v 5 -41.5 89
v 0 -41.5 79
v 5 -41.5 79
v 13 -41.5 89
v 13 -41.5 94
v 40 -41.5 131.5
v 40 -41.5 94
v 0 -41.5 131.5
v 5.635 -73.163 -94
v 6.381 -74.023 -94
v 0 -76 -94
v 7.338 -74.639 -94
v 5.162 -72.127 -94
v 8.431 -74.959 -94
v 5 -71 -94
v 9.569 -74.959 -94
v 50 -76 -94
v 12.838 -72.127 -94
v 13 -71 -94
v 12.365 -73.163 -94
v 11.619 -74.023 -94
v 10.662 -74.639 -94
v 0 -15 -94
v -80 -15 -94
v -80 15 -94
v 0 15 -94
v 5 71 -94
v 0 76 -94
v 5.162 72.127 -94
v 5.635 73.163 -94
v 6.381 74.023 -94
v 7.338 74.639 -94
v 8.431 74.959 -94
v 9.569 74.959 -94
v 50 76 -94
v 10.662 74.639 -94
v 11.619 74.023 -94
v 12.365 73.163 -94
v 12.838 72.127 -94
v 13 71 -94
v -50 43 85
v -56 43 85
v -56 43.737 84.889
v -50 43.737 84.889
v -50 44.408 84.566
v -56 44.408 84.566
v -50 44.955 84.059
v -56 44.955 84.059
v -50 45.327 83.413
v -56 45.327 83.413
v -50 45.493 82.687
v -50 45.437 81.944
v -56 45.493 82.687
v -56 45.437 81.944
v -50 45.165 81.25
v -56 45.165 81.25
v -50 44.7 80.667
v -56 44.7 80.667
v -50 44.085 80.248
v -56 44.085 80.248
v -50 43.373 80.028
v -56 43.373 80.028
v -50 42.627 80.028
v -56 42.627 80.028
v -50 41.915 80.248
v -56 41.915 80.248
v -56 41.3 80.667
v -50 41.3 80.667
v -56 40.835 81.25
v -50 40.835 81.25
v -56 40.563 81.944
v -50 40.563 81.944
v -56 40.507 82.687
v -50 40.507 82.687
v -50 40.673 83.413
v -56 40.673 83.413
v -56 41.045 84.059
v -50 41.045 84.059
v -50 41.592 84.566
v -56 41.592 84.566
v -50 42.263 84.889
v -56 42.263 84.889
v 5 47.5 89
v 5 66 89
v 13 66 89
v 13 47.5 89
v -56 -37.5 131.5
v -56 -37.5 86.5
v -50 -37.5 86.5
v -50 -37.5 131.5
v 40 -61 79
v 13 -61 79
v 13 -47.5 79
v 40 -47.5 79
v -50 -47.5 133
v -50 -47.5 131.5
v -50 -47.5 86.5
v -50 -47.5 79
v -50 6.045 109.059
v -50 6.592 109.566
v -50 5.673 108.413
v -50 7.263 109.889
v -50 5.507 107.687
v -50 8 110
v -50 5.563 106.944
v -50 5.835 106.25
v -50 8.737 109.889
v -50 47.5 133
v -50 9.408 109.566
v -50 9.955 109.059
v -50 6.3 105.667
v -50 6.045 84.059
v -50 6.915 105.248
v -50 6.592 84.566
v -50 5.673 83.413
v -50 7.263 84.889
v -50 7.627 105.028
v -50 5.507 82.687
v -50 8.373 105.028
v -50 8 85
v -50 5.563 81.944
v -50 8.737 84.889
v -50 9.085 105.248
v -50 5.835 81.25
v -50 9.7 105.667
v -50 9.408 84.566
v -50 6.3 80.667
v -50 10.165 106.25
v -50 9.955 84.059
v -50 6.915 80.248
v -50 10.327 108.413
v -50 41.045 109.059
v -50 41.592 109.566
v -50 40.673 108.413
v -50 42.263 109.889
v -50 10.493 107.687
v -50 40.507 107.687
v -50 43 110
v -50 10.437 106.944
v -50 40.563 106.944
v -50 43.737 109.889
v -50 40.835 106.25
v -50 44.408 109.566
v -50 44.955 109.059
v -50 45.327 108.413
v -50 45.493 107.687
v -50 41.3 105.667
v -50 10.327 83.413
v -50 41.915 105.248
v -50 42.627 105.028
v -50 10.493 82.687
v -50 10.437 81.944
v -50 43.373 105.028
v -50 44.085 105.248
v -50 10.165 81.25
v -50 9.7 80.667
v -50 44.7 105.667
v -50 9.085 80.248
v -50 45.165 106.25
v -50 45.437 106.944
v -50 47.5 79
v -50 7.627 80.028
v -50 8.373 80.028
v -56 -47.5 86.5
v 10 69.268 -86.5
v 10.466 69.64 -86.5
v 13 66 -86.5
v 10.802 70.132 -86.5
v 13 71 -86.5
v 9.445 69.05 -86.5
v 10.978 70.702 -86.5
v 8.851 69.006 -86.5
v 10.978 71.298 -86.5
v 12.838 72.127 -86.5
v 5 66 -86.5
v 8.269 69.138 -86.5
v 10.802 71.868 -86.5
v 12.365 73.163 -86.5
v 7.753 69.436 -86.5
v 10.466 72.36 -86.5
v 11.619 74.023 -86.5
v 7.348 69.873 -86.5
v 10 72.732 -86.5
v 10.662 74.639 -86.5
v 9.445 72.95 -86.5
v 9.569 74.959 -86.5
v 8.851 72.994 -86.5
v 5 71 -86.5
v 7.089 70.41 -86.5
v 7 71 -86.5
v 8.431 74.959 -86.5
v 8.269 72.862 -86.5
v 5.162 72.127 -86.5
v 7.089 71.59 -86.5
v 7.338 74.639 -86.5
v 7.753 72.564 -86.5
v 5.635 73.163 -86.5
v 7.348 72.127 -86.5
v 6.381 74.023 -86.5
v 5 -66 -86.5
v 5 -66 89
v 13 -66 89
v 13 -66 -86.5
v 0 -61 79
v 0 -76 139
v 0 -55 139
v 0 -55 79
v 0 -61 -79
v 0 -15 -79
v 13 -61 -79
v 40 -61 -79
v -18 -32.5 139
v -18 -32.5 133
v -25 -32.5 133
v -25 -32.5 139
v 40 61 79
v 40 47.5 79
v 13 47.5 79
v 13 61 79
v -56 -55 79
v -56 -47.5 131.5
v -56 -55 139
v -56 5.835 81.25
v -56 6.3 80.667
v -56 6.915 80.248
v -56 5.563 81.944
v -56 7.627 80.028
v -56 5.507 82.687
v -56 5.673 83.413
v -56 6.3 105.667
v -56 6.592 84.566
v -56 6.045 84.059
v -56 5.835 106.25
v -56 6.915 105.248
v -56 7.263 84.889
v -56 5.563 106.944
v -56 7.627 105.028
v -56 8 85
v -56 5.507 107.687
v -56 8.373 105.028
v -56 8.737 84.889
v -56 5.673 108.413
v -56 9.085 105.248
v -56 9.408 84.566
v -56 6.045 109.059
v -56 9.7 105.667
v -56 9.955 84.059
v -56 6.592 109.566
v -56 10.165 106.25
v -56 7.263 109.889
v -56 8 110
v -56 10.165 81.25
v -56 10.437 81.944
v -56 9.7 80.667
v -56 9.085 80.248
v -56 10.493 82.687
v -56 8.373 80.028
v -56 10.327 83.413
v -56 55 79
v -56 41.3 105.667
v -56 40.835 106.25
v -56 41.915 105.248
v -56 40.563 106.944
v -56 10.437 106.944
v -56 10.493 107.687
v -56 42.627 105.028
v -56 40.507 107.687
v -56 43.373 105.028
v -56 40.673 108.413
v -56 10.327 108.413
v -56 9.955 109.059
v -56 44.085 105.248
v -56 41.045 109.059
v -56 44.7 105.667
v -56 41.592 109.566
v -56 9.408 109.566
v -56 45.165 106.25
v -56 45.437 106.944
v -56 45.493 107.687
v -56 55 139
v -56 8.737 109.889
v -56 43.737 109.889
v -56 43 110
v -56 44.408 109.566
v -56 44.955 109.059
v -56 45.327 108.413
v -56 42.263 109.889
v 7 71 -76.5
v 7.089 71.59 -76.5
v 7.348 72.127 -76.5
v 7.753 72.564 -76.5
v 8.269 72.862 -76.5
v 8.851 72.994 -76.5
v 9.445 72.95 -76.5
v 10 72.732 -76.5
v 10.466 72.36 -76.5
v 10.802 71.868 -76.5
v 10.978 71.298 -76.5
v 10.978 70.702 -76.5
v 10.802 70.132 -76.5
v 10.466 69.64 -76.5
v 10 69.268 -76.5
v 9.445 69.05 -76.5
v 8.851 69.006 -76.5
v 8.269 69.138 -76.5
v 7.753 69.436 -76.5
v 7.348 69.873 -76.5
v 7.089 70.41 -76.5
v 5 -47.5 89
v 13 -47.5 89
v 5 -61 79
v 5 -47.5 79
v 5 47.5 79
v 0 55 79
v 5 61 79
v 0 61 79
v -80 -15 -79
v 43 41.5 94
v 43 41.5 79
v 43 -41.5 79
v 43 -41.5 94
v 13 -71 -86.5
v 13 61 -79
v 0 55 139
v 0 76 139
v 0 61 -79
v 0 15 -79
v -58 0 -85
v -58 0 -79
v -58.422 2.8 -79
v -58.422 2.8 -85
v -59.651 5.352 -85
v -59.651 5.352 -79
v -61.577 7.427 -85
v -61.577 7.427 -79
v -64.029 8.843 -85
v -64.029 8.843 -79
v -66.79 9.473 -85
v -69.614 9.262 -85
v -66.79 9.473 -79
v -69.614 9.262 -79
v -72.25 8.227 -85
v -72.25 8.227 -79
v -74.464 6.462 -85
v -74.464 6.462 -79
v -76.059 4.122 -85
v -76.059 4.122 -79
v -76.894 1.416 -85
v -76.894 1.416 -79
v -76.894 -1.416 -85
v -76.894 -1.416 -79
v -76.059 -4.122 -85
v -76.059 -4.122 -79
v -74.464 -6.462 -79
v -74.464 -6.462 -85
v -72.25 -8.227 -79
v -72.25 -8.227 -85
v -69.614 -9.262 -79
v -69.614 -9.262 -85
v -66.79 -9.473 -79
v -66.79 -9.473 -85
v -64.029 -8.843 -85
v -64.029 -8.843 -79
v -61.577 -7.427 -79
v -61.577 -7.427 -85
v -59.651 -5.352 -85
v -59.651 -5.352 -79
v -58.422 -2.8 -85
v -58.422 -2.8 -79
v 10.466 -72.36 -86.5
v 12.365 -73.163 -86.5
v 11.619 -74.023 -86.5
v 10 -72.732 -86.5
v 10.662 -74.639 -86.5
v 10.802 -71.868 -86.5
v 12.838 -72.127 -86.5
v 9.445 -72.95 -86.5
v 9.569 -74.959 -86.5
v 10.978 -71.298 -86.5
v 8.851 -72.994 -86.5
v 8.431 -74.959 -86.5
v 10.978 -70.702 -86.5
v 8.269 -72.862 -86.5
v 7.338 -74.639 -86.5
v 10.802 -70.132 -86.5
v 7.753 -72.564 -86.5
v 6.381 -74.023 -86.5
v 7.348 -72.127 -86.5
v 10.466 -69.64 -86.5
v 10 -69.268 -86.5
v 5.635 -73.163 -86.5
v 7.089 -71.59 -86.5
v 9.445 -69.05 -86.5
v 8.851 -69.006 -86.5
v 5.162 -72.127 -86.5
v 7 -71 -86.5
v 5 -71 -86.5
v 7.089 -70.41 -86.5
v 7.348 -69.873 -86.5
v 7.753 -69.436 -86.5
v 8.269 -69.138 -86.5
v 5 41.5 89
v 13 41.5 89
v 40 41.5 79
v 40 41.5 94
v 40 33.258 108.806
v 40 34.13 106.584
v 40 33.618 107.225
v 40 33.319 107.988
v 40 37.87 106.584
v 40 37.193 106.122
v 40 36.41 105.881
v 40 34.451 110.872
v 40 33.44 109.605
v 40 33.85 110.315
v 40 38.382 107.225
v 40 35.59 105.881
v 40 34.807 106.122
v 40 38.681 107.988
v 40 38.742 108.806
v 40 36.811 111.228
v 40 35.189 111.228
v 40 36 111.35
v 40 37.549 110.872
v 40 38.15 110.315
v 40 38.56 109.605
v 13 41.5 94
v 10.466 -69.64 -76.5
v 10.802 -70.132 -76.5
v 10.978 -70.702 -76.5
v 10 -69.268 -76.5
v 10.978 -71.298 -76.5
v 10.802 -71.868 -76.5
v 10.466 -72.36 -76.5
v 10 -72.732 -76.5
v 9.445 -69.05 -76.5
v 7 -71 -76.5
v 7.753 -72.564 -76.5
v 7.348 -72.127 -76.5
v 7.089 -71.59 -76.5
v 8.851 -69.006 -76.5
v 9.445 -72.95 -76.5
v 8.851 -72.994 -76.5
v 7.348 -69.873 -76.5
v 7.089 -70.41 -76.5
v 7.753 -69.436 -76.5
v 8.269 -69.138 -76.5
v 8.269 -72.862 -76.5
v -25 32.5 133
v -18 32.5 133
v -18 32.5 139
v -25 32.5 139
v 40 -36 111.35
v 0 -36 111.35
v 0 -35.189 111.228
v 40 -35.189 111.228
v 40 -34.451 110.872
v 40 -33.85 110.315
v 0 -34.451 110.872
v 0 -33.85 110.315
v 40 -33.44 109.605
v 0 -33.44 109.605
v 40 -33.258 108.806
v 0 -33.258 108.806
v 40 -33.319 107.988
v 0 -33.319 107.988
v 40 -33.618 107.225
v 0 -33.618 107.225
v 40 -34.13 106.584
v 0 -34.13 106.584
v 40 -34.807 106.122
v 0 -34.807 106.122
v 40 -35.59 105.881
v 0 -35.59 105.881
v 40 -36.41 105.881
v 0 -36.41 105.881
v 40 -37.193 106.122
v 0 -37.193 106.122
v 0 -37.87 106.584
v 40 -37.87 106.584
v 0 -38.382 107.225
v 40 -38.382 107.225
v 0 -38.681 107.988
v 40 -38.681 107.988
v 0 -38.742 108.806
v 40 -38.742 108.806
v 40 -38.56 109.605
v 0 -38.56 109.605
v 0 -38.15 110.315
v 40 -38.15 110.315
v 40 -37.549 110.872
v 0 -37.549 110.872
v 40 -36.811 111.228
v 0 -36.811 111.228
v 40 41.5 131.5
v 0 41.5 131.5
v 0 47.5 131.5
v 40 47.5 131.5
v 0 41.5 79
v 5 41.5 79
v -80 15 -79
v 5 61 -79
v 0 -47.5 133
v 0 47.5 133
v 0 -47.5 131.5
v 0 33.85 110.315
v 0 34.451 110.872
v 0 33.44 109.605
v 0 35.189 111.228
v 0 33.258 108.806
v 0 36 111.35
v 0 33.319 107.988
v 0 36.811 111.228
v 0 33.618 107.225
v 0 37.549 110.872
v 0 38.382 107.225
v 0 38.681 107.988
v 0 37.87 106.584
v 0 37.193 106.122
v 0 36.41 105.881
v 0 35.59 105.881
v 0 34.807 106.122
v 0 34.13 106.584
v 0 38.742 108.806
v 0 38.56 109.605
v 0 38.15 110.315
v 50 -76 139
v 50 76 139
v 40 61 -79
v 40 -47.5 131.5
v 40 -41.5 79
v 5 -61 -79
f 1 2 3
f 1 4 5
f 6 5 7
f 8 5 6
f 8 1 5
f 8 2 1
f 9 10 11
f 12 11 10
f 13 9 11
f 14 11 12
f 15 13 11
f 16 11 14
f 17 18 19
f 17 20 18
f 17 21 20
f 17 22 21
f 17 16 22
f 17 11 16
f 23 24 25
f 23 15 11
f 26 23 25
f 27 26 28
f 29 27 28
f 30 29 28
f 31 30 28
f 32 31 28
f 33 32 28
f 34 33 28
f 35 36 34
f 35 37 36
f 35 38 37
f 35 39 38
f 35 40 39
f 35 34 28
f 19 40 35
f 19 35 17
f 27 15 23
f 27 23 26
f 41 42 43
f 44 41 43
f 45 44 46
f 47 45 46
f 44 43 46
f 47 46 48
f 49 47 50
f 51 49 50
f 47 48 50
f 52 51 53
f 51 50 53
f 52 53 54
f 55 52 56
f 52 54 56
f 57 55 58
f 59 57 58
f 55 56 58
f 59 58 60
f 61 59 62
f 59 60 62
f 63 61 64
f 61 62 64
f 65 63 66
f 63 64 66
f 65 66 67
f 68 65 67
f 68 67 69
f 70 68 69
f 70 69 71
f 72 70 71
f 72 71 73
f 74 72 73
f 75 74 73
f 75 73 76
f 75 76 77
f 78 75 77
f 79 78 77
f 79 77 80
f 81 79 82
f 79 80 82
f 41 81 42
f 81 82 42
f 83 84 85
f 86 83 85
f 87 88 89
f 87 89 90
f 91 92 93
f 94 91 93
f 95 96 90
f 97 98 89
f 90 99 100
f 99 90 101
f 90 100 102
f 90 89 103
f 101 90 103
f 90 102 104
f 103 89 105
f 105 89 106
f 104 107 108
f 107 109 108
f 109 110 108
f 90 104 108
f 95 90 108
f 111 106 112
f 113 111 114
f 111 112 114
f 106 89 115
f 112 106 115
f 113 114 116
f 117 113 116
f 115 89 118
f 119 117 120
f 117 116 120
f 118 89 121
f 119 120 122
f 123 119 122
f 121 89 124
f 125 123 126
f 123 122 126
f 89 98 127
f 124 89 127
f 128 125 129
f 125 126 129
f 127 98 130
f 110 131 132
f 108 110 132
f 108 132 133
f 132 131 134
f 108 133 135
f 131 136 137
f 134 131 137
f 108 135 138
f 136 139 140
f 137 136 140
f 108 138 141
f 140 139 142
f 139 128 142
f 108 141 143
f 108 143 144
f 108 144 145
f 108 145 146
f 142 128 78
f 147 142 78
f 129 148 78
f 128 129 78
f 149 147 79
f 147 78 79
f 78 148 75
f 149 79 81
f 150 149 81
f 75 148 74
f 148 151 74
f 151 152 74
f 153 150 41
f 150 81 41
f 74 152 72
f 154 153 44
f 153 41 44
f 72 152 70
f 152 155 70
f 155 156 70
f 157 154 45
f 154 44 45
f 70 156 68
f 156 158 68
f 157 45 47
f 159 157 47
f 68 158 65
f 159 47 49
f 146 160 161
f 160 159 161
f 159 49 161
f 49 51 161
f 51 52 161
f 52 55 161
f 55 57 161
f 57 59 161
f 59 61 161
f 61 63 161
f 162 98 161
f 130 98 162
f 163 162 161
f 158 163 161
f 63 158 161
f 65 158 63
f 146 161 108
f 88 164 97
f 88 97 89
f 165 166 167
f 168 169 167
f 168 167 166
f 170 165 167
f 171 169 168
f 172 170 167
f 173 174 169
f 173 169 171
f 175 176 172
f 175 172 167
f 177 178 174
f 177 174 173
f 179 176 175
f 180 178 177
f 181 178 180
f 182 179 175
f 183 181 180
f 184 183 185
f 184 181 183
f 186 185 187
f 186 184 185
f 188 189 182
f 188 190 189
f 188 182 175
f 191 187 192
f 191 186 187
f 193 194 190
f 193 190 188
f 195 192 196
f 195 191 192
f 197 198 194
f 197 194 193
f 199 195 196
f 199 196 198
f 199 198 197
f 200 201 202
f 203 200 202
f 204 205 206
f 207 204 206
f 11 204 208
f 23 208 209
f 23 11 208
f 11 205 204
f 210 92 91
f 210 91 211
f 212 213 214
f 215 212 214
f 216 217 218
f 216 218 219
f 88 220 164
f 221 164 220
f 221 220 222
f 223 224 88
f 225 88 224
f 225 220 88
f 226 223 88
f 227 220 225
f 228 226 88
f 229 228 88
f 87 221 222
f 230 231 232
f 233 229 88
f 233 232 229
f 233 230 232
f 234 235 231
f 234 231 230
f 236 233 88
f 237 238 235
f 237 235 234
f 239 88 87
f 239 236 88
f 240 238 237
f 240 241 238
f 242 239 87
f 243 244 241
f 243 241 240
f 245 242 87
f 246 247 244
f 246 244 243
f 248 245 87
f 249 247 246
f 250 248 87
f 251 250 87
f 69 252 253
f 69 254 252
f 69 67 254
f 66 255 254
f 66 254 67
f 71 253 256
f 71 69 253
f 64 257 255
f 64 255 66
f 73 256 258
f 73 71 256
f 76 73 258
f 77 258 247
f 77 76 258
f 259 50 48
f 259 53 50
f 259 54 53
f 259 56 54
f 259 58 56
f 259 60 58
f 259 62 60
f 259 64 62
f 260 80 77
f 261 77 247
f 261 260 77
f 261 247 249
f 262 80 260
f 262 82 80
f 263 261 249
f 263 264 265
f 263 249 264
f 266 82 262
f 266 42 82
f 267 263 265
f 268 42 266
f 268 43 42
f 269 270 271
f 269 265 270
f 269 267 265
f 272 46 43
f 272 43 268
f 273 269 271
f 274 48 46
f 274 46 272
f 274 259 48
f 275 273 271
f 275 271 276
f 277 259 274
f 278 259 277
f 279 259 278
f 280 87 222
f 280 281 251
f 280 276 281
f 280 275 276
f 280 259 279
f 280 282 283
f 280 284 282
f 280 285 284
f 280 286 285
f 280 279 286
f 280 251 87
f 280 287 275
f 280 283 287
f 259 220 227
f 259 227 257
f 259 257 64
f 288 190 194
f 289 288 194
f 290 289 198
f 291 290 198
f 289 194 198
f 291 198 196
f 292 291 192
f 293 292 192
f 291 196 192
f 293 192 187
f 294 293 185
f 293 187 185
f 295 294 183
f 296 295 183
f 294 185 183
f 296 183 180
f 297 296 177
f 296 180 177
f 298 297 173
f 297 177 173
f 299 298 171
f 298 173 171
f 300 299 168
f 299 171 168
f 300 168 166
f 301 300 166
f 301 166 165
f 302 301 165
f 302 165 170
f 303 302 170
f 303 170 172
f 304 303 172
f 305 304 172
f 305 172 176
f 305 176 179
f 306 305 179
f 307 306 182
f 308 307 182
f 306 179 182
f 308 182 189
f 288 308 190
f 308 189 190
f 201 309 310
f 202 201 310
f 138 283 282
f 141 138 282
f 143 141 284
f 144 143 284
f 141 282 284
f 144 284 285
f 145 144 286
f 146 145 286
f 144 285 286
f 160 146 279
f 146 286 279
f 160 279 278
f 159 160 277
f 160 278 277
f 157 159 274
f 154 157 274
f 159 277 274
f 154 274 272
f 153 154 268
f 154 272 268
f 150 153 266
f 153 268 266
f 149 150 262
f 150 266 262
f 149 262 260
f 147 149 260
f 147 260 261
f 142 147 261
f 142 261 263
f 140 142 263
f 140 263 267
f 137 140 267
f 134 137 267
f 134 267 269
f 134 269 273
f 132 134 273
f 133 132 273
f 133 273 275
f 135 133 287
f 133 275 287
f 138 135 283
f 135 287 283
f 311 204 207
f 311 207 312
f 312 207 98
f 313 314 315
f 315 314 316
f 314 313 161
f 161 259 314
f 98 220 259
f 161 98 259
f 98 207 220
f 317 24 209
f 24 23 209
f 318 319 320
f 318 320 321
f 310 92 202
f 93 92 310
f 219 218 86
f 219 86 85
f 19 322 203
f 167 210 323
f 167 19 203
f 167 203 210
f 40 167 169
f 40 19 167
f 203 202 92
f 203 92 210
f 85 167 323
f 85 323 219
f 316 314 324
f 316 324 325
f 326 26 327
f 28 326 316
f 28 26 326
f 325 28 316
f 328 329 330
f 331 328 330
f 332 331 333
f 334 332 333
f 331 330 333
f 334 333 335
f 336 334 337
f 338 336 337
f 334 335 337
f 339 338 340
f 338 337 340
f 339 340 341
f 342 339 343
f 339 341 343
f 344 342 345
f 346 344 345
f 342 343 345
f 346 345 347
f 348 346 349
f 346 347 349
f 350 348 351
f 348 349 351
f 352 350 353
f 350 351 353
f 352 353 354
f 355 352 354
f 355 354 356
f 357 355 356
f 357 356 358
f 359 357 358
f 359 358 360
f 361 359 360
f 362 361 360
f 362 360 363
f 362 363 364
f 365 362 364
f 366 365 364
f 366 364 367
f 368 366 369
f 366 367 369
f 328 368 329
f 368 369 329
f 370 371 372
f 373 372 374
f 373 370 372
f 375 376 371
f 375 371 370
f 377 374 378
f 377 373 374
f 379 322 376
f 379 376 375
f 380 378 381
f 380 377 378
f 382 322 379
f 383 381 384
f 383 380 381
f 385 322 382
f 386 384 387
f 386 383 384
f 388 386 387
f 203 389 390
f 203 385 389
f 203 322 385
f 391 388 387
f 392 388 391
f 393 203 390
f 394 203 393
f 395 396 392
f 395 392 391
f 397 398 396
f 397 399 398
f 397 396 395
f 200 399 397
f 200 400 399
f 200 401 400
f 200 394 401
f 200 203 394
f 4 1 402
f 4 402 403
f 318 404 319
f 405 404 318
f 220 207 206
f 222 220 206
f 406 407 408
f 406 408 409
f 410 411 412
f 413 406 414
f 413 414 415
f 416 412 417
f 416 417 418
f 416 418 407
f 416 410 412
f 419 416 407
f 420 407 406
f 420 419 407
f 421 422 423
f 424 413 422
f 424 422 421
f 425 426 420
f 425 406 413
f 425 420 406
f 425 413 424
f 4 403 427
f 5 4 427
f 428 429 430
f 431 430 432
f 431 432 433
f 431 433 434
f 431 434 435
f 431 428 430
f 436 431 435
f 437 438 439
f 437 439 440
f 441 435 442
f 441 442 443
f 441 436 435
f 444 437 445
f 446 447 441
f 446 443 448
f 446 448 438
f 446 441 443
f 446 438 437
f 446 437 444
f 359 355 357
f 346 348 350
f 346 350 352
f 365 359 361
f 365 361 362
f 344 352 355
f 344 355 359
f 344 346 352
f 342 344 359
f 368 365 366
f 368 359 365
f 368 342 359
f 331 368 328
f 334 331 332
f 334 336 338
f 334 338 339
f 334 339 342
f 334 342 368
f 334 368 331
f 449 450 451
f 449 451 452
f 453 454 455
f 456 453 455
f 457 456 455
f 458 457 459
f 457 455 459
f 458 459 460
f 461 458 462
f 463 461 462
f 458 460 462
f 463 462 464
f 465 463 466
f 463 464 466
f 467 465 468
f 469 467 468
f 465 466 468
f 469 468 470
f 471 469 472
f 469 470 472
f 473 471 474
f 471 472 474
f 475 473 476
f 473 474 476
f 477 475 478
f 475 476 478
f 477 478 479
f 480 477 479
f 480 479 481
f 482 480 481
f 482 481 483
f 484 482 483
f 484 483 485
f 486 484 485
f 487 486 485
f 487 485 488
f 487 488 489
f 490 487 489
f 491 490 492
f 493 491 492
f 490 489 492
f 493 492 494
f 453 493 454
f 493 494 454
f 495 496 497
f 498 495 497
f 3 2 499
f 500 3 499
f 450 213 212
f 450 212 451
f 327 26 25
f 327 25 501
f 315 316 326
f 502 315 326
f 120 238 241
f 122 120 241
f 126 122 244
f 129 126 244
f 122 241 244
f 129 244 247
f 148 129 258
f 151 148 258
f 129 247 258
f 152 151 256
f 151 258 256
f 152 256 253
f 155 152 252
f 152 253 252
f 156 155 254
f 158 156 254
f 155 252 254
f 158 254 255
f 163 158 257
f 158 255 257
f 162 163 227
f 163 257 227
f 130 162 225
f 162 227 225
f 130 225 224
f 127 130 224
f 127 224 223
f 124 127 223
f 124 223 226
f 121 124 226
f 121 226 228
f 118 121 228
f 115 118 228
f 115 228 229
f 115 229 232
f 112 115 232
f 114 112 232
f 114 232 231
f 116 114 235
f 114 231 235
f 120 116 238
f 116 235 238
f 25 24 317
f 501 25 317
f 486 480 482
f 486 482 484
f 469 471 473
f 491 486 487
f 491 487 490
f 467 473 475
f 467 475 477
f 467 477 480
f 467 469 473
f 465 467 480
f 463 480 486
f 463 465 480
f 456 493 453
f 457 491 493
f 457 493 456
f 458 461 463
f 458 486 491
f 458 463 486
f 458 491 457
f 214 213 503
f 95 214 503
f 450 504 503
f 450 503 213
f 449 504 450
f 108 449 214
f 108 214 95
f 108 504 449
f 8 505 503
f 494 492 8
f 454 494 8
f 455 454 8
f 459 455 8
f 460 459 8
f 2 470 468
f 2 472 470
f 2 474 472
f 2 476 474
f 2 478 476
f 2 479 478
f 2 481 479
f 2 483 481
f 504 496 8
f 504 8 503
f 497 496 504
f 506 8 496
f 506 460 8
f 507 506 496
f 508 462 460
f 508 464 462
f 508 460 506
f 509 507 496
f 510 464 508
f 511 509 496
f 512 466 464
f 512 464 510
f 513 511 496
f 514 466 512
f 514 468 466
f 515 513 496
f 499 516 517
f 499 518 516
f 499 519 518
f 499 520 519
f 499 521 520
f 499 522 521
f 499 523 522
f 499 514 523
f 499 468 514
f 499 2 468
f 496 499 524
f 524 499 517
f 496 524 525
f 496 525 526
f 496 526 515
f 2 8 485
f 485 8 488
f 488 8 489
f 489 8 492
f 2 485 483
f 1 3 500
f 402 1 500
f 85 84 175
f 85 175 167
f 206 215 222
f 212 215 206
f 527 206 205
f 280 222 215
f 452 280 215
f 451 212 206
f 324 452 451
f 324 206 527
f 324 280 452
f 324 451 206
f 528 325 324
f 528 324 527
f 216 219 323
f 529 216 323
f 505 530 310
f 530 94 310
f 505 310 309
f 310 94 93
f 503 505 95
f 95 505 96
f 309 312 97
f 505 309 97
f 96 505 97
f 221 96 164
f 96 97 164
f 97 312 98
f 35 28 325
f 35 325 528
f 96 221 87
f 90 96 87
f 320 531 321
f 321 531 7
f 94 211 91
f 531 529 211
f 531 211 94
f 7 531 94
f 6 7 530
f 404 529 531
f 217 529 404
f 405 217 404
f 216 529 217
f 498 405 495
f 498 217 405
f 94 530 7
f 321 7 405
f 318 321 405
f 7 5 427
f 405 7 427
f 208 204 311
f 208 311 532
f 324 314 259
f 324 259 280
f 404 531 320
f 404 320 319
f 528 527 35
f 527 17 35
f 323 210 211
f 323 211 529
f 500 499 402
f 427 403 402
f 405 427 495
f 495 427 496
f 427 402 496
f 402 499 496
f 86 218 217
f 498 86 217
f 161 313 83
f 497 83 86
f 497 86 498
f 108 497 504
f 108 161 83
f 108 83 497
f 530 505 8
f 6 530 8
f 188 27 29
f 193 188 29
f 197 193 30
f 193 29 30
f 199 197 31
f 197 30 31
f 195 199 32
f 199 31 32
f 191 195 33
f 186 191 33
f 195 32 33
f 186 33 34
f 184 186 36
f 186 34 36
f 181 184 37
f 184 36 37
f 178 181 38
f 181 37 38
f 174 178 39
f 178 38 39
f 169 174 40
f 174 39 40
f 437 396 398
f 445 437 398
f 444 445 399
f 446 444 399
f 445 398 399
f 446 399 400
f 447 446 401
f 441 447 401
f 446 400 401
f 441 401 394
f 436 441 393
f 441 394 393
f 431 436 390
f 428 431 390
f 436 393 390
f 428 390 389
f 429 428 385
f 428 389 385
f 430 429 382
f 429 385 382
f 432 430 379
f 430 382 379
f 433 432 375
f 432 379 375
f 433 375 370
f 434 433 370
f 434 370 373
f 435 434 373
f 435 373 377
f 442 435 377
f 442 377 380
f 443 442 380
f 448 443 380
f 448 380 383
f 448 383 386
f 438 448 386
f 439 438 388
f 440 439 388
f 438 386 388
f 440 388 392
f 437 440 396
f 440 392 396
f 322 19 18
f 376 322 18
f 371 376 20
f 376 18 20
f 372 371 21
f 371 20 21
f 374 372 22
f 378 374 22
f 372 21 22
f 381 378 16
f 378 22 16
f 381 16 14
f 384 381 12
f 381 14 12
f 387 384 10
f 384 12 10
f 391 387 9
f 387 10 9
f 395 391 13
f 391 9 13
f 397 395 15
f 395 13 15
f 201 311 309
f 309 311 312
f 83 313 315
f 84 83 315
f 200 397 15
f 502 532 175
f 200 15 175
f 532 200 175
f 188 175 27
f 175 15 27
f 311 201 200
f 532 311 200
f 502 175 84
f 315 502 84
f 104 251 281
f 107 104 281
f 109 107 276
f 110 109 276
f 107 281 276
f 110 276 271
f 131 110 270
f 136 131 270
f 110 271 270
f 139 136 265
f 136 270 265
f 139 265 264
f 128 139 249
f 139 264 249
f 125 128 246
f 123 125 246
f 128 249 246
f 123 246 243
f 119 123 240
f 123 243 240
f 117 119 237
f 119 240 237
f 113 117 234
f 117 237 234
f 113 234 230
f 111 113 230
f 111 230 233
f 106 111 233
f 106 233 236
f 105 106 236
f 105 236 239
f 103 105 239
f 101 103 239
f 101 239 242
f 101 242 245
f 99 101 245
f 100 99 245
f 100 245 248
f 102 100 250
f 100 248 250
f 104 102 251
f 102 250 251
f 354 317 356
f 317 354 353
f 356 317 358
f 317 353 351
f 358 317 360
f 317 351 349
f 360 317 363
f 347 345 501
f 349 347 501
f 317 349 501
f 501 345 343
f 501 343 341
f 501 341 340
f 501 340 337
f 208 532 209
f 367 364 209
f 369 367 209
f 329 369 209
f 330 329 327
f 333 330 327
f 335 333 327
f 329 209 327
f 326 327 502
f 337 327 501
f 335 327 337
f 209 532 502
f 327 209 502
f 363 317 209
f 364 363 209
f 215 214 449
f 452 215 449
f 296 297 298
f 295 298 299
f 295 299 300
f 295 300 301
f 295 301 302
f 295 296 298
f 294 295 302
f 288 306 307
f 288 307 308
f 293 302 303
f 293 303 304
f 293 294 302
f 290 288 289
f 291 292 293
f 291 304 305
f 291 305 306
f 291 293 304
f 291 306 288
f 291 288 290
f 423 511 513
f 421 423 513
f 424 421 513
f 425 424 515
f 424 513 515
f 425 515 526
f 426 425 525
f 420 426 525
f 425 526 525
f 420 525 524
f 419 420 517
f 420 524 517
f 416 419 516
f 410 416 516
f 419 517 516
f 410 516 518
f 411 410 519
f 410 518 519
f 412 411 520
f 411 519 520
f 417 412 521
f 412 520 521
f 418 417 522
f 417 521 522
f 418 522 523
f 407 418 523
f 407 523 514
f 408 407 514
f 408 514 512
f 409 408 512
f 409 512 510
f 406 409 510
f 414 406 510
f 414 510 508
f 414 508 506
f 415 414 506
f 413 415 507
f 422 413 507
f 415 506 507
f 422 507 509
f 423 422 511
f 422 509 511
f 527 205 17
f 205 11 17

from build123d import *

# Parameters (mm, degrees)
SKETCH1_W                = 238
SKETCH1_H                = 152
SKETCH1_W_2              = 158
SKETCH1_H_2              = 122
BOSS_EXTRUDE1_DEPTH      = 50
SKETCH4_W                = 158
SKETCH4_H                = 122
BOSS_EXTRUDE2_DEPTH      = 10
CUT_EXTRUDE1_START       = -30
SKETCH5_W                = 8
SKETCH5_H                = 132
CUT_EXTRUDE1_DEPTH       = 204
SKETCH8_W                = 25
SKETCH8_H                = 152
CUT_EXTRUDE3_DEPTH       = 50
SKETCH11_W               = 15
SKETCH11_H               = 30
BOSS_EXTRUDE4_DEPTH      = 75
SKETCH16_W               = 15
SKETCH16_H               = 30
BOSS_EXTRUDE6_DEPTH      = 5
SKETCH18_R               = 4
SKETCH18_W               = 8
SKETCH18_H               = 5
CUT_EXTRUDE8_DEPTH       = 7.5
SKETCH19_R               = 2
CUT_EXTRUDE9_DEPTH       = 10
SKETCH20_W               = 50
SKETCH20_H               = 152
BOSS_EXTRUDE7_DEPTH      = 20
SKETCH21_W               = 60
SKETCH21_H               = 110
BOSS_EXTRUDE8_DEPTH      = 56
SKETCH22_W               = 50
SKETCH22_H               = 95
CUT_EXTRUDE10_DEPTH      = 54
SKETCH24_R               = 2.75
CUT_EXTRUDE11_DEPTH      = 1
CUT_EXTRUDE11_DEPTH_BACK = 40
SKETCH25_W               = 7
SKETCH25_H               = 65
CUT_EXTRUDE12_DEPTH      = 12
SKETCH26_W               = 52.5
SKETCH26_H               = 6
CUT_EXTRUDE13_DEPTH      = 40
SKETCH27_W               = 15
SKETCH27_H               = 83
CUT_EXTRUDE14_DEPTH      = 30
SKETCH29_R               = 9.5
CUT_EXTRUDE15_DEPTH      = 6
SKETCH30_R               = 2.5
CUT_EXTRUDE16_DEPTH      = 6
SKETCH34_W               = 45
SKETCH34_H               = 10
CUT_EXTRUDE17_DEPTH      = 10


with BuildPart() as part:
    # Sketch1 → Boss-Extrude1 (new body)
    with BuildSketch(Plane(origin=(0, 0, 0), x_dir=(0, 0, -1), z_dir=(1, 0, 0))):
        Rectangle(SKETCH1_W, SKETCH1_H)
        Rectangle(SKETCH1_W_2, SKETCH1_H_2, mode=Mode.SUBTRACT)
    extrude(amount=BOSS_EXTRUDE1_DEPTH)

    # Sketch4 → Boss-Extrude2 (add)
    with BuildSketch(Plane(origin=(50, 0, 0), x_dir=(0, 0, -1), z_dir=(1, 0, 0))):
        Rectangle(SKETCH4_W, SKETCH4_H)
    extrude(amount=-BOSS_EXTRUDE2_DEPTH)

    # Sketch5 → Cut-Extrude1 (cut)
    with BuildSketch(Plane.XY.offset(119).offset(CUT_EXTRUDE1_START)):
        with Locations((9, 0)):
            Rectangle(SKETCH5_W, SKETCH5_H)
    extrude(amount=-CUT_EXTRUDE1_DEPTH, mode=Mode.SUBTRACT)

    # Sketch8 → Cut-Extrude3 (cut)
    with BuildSketch(Plane.ZY):
        with Locations((-106.5, 0)):
            Rectangle(SKETCH8_W, SKETCH8_H)
    extrude(amount=-CUT_EXTRUDE3_DEPTH, mode=Mode.SUBTRACT)

    # Sketch11 → Boss-Extrude4 (add)
    with BuildSketch(Plane.ZY):
        with Locations((-86.5, 0)):
            Rectangle(SKETCH11_W, SKETCH11_H)
    extrude(amount=BOSS_EXTRUDE4_DEPTH)

    # Sketch16 → Boss-Extrude6 (add)
    with BuildSketch(Plane.ZY.offset(75)):
        with Locations((-86.5, 0)):
            Rectangle(SKETCH16_W, SKETCH16_H)
    extrude(amount=BOSS_EXTRUDE6_DEPTH)

    # Sketch18 → Cut-Extrude8 (cut)
    with BuildSketch(Plane(origin=(0, 0, -94), x_dir=(-1, 0, 0), z_dir=(0, 0, -1))):
        with Locations((-9, 71)):
            Circle(SKETCH18_R)
        with Locations((-9, -71)):
            Circle(SKETCH18_R)
        with Locations((-9, 68.5)):
            Rectangle(SKETCH18_W, SKETCH18_H)
        with Locations((-9, -68.5)):
            Rectangle(SKETCH18_W, SKETCH18_H)
    extrude(amount=-CUT_EXTRUDE8_DEPTH, mode=Mode.SUBTRACT)

    # Sketch19 → Cut-Extrude9 (cut)
    with BuildSketch(Plane(origin=(0, 0, -86.5), x_dir=(-1, 0, 0), z_dir=(0, 0, -1))):
        with Locations((-9, 71)):
            Circle(SKETCH19_R)
        with Locations((-9, -71)):
            Circle(SKETCH19_R)
    extrude(amount=-CUT_EXTRUDE9_DEPTH, mode=Mode.SUBTRACT)

    # Sketch20 → Boss-Extrude7 (add)
    with BuildSketch(Plane.XY.offset(119)):
        with Locations((25, 0)):
            Rectangle(SKETCH20_W, SKETCH20_H)
    extrude(amount=BOSS_EXTRUDE7_DEPTH)

    # Sketch21 → Boss-Extrude8 (add)
    with BuildSketch(Plane.ZY):
        with Locations((109, 0)):
            Rectangle(SKETCH21_W, SKETCH21_H)
    extrude(amount=BOSS_EXTRUDE8_DEPTH)

    # Sketch22 → Cut-Extrude10 (cut)
    with BuildSketch(Plane(origin=(0, 0, 79), x_dir=(-1, 0, 0), z_dir=(0, 0, -1))):
        with Locations((25, 0)):
            Rectangle(SKETCH22_W, SKETCH22_H)
    extrude(amount=-CUT_EXTRUDE10_DEPTH, mode=Mode.SUBTRACT)

    # Sketch24 → Cut-Extrude11 (cut, two sides)
    with BuildSketch(Plane.ZY) as cut_extrude11_sk:
        with Locations((108.6, 36)):
            Circle(SKETCH24_R)
        with Locations((108.6, -36)):
            Circle(SKETCH24_R)
    extrude(amount=CUT_EXTRUDE11_DEPTH, mode=Mode.SUBTRACT)
    extrude(cut_extrude11_sk.sketch, amount=-CUT_EXTRUDE11_DEPTH_BACK, mode=Mode.SUBTRACT)

    # Sketch25 → Cut-Extrude12 (cut)
    with BuildSketch(Plane(origin=(0, 0, 133), x_dir=(-1, 0, 0), z_dir=(0, 0, -1))):
        with Locations((21.5, 0)):
            Rectangle(SKETCH25_W, SKETCH25_H)
    extrude(amount=-CUT_EXTRUDE12_DEPTH, mode=Mode.SUBTRACT)

    # Sketch26 → Cut-Extrude13 (cut)
    with BuildSketch(Plane.ZY):
        with Locations((105.25, 44.5)):
            Rectangle(SKETCH26_W, SKETCH26_H)
        with Locations((105.25, -44.5)):
            Rectangle(SKETCH26_W, SKETCH26_H)
    extrude(amount=-CUT_EXTRUDE13_DEPTH, mode=Mode.SUBTRACT)

    # Sketch27 → Cut-Extrude14 (cut)
    with BuildSketch(Plane.ZY.offset(-13)):
        with Locations((86.5, 0)):
            Rectangle(SKETCH27_W, SKETCH27_H)
    extrude(amount=-CUT_EXTRUDE14_DEPTH, mode=Mode.SUBTRACT)

    # Sketch29 → Cut-Extrude15 (cut)
    with BuildSketch(Plane.XY.offset(-79)):
        with Locations((-67.5, 0)):
            Circle(SKETCH29_R)
    extrude(amount=-CUT_EXTRUDE15_DEPTH, mode=Mode.SUBTRACT)

    # Sketch30 → Cut-Extrude16 (cut)
    with BuildSketch(Plane.ZY.offset(56)):
        with Locations((82.5, 8)):
            Circle(SKETCH30_R)
        with Locations((107.5, 8)):
            Circle(SKETCH30_R)
        with Locations((82.5, 43)):
            Circle(SKETCH30_R)
        with Locations((107.5, 43)):
            Circle(SKETCH30_R)
    extrude(amount=-CUT_EXTRUDE16_DEPTH, mode=Mode.SUBTRACT)

    # Sketch34 → Cut-Extrude17 (cut)
    with BuildSketch(Plane.ZY.offset(56)):
        with Locations((109, -42.5)):
            Rectangle(SKETCH34_W, SKETCH34_H)
    extrude(amount=-CUT_EXTRUDE17_DEPTH, mode=Mode.SUBTRACT)


solid = part.part
